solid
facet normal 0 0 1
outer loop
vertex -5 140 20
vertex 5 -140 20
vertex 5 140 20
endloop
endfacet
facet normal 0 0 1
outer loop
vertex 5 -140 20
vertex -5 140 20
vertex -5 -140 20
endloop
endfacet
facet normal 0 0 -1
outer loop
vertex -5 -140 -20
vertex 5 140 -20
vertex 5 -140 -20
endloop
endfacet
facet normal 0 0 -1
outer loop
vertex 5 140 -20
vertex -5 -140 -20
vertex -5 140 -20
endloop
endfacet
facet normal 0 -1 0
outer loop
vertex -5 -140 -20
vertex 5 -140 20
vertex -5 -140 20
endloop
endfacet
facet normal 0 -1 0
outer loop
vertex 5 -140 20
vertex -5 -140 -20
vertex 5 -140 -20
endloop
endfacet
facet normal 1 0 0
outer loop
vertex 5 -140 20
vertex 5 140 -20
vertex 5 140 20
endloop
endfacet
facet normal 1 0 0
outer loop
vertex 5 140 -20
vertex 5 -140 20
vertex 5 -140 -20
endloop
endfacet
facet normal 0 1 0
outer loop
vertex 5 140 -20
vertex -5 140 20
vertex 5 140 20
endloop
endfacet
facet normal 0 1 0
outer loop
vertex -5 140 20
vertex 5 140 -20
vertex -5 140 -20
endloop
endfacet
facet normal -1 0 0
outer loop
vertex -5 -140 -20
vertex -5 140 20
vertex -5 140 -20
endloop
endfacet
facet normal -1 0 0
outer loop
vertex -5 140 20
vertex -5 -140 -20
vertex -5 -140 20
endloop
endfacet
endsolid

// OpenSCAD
arm_x = 10;
arm_y = 280;
arm_z = 40;
cube([arm_x, arm_y, arm_z],center=true);
